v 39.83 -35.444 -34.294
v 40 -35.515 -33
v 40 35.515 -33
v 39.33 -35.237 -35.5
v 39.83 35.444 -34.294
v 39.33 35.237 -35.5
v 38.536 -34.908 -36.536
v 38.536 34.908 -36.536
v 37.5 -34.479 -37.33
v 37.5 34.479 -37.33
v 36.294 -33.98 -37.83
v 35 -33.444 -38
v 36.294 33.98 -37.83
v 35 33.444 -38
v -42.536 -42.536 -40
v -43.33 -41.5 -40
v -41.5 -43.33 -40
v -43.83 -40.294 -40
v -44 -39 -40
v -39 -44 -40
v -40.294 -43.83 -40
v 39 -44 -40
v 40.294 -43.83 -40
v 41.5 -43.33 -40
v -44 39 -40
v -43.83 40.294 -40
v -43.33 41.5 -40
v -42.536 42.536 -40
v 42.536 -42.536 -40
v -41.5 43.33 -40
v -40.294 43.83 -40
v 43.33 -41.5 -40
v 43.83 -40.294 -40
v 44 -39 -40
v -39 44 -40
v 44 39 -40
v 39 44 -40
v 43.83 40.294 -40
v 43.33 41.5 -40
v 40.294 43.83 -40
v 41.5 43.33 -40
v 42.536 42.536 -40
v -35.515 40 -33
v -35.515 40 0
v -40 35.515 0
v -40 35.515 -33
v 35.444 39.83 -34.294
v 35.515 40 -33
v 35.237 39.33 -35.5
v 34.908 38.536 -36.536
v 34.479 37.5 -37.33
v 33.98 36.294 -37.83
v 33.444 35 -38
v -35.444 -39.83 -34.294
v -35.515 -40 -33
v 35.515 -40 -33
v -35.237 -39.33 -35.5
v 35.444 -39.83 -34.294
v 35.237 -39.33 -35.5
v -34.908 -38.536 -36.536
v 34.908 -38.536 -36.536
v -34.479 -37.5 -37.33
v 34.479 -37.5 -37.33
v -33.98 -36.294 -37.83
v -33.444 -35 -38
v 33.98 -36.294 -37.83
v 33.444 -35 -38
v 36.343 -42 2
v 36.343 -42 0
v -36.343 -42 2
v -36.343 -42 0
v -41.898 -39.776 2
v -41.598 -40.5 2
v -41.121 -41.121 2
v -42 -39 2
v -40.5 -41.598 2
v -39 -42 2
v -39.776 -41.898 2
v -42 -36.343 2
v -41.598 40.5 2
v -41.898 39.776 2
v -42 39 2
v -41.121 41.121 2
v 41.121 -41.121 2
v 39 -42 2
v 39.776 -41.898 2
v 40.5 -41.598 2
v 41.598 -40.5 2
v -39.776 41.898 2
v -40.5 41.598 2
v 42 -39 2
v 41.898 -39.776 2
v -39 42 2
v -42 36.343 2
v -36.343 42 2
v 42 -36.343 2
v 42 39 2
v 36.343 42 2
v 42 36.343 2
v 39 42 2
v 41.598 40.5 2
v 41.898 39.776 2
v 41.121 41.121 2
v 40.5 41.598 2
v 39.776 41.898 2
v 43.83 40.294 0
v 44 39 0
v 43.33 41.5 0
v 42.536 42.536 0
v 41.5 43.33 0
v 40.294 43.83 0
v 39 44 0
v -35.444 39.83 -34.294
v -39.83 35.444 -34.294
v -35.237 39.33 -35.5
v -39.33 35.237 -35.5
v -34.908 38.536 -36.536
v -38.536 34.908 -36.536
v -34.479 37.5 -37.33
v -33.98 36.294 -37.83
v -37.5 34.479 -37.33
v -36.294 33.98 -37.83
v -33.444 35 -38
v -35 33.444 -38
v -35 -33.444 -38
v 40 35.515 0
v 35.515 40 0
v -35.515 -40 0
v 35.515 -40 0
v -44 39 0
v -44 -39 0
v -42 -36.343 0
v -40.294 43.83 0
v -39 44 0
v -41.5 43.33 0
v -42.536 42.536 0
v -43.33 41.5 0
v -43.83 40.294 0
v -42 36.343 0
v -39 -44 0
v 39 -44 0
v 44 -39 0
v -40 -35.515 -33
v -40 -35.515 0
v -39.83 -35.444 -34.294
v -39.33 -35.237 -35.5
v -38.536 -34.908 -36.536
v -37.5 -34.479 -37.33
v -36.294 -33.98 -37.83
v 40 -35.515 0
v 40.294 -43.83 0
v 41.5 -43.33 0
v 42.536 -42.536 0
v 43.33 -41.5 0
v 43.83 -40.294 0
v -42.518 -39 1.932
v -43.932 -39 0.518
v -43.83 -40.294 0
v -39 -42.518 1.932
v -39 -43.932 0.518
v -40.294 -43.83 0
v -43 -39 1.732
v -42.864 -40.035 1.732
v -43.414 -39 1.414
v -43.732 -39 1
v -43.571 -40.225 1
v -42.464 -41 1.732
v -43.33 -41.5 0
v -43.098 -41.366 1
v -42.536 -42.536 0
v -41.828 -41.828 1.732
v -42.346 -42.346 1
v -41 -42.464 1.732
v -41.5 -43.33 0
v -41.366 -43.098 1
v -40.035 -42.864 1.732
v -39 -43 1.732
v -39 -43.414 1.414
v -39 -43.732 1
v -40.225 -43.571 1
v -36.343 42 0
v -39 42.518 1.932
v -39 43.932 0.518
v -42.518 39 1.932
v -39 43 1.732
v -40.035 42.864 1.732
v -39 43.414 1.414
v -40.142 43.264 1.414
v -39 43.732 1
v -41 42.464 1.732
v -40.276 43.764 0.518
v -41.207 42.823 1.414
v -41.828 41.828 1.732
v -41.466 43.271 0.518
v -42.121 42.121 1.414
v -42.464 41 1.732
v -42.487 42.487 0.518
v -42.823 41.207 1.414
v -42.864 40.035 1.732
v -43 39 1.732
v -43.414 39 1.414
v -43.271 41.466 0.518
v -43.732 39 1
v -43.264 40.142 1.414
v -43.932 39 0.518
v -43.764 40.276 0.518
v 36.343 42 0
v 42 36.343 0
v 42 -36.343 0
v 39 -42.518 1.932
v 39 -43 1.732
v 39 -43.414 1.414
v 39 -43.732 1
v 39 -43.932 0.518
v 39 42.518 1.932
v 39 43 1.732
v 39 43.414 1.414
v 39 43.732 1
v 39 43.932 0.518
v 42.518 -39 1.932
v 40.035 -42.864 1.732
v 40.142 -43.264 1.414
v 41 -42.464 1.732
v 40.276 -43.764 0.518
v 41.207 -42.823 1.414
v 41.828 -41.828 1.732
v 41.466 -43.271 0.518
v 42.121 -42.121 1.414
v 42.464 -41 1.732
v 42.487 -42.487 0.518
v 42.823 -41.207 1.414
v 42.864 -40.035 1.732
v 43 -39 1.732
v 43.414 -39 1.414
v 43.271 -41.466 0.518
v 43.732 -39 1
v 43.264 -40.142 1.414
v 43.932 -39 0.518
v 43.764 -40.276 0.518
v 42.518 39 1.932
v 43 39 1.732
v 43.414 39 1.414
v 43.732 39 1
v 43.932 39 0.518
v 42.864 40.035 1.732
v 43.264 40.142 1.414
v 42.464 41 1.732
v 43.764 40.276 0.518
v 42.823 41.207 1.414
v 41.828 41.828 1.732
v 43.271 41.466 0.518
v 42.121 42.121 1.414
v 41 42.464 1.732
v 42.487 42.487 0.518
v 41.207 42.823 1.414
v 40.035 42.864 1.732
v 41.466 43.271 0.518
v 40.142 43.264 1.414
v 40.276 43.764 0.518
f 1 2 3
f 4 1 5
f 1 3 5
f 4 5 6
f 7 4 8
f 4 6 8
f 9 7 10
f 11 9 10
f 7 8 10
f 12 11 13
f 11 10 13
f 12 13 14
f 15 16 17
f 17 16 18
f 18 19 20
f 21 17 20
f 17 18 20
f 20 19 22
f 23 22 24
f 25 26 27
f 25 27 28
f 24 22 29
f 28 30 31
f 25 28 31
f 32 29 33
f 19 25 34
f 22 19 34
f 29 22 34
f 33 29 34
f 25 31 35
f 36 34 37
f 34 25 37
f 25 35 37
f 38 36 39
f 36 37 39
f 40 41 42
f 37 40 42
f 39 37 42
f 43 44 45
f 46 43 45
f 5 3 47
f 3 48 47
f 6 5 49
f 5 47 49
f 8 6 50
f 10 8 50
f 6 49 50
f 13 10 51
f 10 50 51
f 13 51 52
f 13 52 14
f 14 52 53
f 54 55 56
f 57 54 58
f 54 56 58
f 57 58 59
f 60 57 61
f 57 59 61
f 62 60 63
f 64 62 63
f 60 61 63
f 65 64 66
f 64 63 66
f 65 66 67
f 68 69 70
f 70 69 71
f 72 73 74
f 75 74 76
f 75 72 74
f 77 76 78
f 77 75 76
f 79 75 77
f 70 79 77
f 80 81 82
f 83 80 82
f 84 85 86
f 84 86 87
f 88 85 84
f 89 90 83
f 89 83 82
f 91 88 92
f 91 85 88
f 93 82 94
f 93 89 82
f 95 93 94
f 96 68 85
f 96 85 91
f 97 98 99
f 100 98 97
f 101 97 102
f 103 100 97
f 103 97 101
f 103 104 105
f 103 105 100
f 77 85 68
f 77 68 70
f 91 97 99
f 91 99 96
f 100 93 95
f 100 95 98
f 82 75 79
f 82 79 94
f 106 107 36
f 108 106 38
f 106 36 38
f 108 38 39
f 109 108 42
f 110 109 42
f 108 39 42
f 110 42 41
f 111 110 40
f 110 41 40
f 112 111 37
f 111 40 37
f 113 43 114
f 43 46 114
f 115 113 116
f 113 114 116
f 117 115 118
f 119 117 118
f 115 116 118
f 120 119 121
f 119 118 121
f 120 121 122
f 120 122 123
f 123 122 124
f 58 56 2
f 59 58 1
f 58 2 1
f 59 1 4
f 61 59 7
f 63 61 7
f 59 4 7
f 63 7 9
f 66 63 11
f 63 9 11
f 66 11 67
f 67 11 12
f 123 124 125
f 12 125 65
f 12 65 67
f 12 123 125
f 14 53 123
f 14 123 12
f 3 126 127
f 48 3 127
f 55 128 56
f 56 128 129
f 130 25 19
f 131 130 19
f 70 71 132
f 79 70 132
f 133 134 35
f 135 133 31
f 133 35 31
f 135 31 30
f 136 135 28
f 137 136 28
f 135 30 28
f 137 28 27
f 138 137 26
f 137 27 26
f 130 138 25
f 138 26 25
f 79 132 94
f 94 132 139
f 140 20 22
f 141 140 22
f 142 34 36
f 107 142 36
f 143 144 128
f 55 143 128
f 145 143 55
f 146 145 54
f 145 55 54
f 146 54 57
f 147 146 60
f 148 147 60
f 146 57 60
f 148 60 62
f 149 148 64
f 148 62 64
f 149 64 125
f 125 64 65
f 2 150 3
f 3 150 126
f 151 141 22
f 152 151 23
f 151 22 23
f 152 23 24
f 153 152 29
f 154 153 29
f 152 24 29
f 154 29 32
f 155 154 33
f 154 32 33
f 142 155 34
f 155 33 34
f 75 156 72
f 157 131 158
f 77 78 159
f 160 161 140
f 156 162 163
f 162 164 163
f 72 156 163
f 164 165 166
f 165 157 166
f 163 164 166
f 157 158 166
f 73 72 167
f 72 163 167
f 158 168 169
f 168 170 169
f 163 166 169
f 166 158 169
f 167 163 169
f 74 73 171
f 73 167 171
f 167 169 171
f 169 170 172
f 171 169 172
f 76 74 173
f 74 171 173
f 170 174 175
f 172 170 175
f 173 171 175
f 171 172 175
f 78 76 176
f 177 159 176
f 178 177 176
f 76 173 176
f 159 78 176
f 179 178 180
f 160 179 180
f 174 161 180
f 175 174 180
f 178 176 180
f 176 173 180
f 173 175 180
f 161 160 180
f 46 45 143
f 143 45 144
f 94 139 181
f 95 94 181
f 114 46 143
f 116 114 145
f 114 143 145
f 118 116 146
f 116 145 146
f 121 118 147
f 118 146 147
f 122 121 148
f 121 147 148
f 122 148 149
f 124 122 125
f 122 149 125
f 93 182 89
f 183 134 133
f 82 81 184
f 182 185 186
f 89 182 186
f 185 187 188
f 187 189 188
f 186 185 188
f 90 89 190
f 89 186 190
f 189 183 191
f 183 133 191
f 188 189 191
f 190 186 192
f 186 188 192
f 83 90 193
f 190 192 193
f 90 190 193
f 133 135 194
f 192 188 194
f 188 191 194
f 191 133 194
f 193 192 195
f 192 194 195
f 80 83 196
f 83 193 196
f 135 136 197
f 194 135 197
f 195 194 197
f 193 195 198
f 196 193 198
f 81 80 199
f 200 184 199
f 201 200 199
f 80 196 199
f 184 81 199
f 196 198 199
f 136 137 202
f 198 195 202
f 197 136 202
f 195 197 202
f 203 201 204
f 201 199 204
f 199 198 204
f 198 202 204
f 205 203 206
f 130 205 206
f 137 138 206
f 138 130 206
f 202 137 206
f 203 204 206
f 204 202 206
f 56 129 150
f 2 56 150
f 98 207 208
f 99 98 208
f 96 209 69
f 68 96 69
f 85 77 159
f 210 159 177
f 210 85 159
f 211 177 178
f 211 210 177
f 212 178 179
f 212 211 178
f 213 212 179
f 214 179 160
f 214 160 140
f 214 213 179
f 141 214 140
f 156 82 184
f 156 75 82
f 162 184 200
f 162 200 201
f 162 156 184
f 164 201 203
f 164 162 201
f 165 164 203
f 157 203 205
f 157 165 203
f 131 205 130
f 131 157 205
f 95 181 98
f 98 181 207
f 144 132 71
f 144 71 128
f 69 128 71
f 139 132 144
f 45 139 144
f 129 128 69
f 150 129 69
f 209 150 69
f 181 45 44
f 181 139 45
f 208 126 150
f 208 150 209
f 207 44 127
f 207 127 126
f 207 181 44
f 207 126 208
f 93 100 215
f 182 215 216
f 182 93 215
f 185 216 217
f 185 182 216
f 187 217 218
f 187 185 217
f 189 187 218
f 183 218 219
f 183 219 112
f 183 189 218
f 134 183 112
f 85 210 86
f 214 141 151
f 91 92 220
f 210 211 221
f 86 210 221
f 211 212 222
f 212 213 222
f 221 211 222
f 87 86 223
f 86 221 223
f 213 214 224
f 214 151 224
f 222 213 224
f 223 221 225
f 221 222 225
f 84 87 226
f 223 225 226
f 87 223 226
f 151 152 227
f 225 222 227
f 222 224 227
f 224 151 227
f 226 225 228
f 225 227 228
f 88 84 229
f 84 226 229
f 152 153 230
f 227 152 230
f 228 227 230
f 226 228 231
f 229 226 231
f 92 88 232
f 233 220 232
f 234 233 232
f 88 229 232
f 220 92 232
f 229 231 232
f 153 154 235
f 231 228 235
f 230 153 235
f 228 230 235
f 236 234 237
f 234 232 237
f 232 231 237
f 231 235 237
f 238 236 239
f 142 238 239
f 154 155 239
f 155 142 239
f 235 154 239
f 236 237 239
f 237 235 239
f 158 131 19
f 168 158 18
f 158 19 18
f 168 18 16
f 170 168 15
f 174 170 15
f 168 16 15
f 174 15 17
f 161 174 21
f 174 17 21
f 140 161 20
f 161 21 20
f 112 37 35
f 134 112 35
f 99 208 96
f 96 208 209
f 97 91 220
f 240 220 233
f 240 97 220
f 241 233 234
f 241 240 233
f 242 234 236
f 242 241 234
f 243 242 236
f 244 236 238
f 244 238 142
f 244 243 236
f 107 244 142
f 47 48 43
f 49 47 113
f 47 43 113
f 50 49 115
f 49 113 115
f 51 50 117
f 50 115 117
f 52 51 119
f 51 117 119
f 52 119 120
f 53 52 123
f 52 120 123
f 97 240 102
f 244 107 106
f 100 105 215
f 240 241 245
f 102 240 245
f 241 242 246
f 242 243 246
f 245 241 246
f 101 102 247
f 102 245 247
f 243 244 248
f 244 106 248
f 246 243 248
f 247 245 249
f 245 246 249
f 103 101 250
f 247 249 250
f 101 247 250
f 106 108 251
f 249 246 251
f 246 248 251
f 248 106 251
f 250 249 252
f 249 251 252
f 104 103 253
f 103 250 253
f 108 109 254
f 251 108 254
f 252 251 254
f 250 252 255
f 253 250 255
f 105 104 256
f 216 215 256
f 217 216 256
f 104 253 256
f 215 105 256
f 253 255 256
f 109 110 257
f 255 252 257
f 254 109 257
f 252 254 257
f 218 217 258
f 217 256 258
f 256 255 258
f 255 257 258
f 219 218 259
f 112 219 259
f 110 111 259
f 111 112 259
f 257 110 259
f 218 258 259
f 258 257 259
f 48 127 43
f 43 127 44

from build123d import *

# Parameters (mm, degrees)
F1_DEPTH = 40
F2_DEPTH = 38
F3_DEPTH = 2
F4_R     = 1.99999
F5_R     = 5


# Not quite as in the source:
# - a fillet or chamfer is up to 0.001 mm smaller than in the source, because OpenCascade refuses the exact size


with BuildPart() as f1:
    # F0 (on Top) → F1 (new body)
    with BuildSketch(Plane.XY):
        with BuildLine():
            Line((-39, -44), (39, -44))
            ThreePointArc((39, -44), (42.5355339059, -42.5355339059), (44, -39))
            Line((44, -39), (44, 39))
            ThreePointArc((44, 39), (42.5355339059, 42.5355339059), (39, 44))
            Line((39, 44), (-39, 44))
            ThreePointArc((-39, 44), (-42.5355339059, 42.5355339059), (-44, 39))
            Line((-44, 39), (-44, -39))
            ThreePointArc((-44, -39), (-42.5355339059, -42.5355339059), (-39, -44))
        make_face()
        Polygon((42, -36.3431457505), (42, -42), (36.3431457505, -42), (-36.3431457505, -42), (-42, -42), (-42, -36.3431457505), (-42, 36.3431457505), (-42, 42), (-36.3431457505, 42), (36.3431457505, 42), (42, 42), (42, 36.3431457505), align=None, mode=Mode.SUBTRACT)
        Polygon((-35.5147186258, -40), (35.5147186258, -40), (40, -35.5147186258), (40, 35.5147186258), (35.5147186258, 40), (-35.5147186258, 40), (-40, 35.5147186258), (-40, -35.5147186258), align=None)
        Polygon((40, 35.5147186258), (40, 38.3431457505), (38.3431457505, 40), (35.5147186258, 40), align=None)
        Polygon((40, 38.3431457505), (42, 36.3431457505), (42, 42), (36.3431457505, 42), (38.3431457505, 40), (40, 40), align=None)
        Polygon((38.3431457505, 40), (40, 38.3431457505), (40, 40), align=None)
        Polygon((40, -38.3431457505), (42, -36.3431457505), (42, 36.3431457505), (40, 38.3431457505), (40, 35.5147186258), (40, -35.5147186258), align=None)
        Polygon((38.3431457505, 40), (36.3431457505, 42), (-36.3431457505, 42), (-38.3431457505, 40), (-35.5147186258, 40), (35.5147186258, 40), align=None)
        Polygon((-38.3431457505, 40), (-40, 38.3431457505), (-40, 35.5147186258), (-35.5147186258, 40), align=None)
        Polygon((-40, 40), (-40, 38.3431457505), (-38.3431457505, 40), align=None)
        Polygon((-42, 42), (-42, 36.3431457505), (-40, 38.3431457505), (-40, 40), (-38.3431457505, 40), (-36.3431457505, 42), align=None)
        Polygon((-42, 36.3431457505), (-42, -36.3431457505), (-40, -38.3431457505), (-40, -35.5147186258), (-40, 35.5147186258), (-40, 38.3431457505), align=None)
        Polygon((-40, -38.3431457505), (-38.3431457505, -40), (-35.5147186258, -40), (-40, -35.5147186258), align=None)
        Polygon((-40, -40), (-38.3431457505, -40), (-40, -38.3431457505), align=None)
        Polygon((-42, -42), (-36.3431457505, -42), (-38.3431457505, -40), (-40, -40), (-40, -38.3431457505), (-42, -36.3431457505), align=None)
        Polygon((-36.3431457505, -42), (36.3431457505, -42), (38.3431457505, -40), (35.5147186258, -40), (-35.5147186258, -40), (-38.3431457505, -40), align=None)
        Polygon((35.5147186258, -40), (38.3431457505, -40), (40, -38.3431457505), (40, -35.5147186258), align=None)
        Polygon((40, -38.3431457505), (38.3431457505, -40), (40, -40), align=None)
        Polygon((36.3431457505, -42), (42, -42), (42, -36.3431457505), (40, -38.3431457505), (40, -40), (38.3431457505, -40), align=None)
    extrude(amount=-F1_DEPTH)

    # F0 (on Top) → F2 (cut)
    with BuildSketch(Plane.XY):
        Polygon((-35.5147186258, -40), (35.5147186258, -40), (40, -35.5147186258), (40, 35.5147186258), (35.5147186258, 40), (-35.5147186258, 40), (-40, 35.5147186258), (-40, -35.5147186258), align=None)
    extrude(amount=-F2_DEPTH, mode=Mode.SUBTRACT)

    # F0 (on Top) → F3 (join)
    with BuildSketch(Plane.XY):
        with BuildLine():
            Line((-39, -44), (39, -44))
            ThreePointArc((39, -44), (42.5355339059, -42.5355339059), (44, -39))
            Line((44, -39), (44, 39))
            ThreePointArc((44, 39), (42.5355339059, 42.5355339059), (39, 44))
            Line((39, 44), (-39, 44))
            ThreePointArc((-39, 44), (-42.5355339059, 42.5355339059), (-44, 39))
            Line((-44, 39), (-44, -39))
            ThreePointArc((-44, -39), (-42.5355339059, -42.5355339059), (-39, -44))
        make_face()
        Polygon((42, -36.3431457505), (42, -42), (36.3431457505, -42), (-36.3431457505, -42), (-42, -42), (-42, -36.3431457505), (-42, 36.3431457505), (-42, 42), (-36.3431457505, 42), (36.3431457505, 42), (42, 42), (42, 36.3431457505), align=None, mode=Mode.SUBTRACT)
        Polygon((-42, 42), (-42, 36.3431457505), (-40, 38.3431457505), (-40, 40), (-38.3431457505, 40), (-36.3431457505, 42), align=None)
        Polygon((-40, 40), (-40, 38.3431457505), (-38.3431457505, 40), align=None)
        Polygon((40, 38.3431457505), (42, 36.3431457505), (42, 42), (36.3431457505, 42), (38.3431457505, 40), (40, 40), align=None)
        Polygon((38.3431457505, 40), (40, 38.3431457505), (40, 40), align=None)
        Polygon((36.3431457505, -42), (42, -42), (42, -36.3431457505), (40, -38.3431457505), (40, -40), (38.3431457505, -40), align=None)
        Polygon((40, -38.3431457505), (38.3431457505, -40), (40, -40), align=None)
        Polygon((-42, -42), (-36.3431457505, -42), (-38.3431457505, -40), (-40, -40), (-40, -38.3431457505), (-42, -36.3431457505), align=None)
        Polygon((-40, -40), (-38.3431457505, -40), (-40, -38.3431457505), align=None)
    extrude(amount=F3_DEPTH)

    # F4 (radius 2 in the source; OpenCascade refuses exactly that, so slightly less here)
    f4_edges = [f1.edges().sort_by_distance(p)[0] for p in [
        (-42.535534, -42.535534, 2),
    ]]
    fillet(f4_edges, radius=F4_R)

    # F5
    f5_edges = [f1.edges().sort_by_distance(p)[0] for p in [
        (0, 40, -38),
        (-40, 0, -38),
        (-37.757359, 37.757359, -38),
        (-37.757359, -37.757359, -38),
        (0, -40, -38),
        (37.757359, -37.757359, -38),
        (40, 0, -38),
        (37.757359, 37.757359, -38),
    ]]
    fillet(f5_edges, radius=F5_R)


solid = f1.part
